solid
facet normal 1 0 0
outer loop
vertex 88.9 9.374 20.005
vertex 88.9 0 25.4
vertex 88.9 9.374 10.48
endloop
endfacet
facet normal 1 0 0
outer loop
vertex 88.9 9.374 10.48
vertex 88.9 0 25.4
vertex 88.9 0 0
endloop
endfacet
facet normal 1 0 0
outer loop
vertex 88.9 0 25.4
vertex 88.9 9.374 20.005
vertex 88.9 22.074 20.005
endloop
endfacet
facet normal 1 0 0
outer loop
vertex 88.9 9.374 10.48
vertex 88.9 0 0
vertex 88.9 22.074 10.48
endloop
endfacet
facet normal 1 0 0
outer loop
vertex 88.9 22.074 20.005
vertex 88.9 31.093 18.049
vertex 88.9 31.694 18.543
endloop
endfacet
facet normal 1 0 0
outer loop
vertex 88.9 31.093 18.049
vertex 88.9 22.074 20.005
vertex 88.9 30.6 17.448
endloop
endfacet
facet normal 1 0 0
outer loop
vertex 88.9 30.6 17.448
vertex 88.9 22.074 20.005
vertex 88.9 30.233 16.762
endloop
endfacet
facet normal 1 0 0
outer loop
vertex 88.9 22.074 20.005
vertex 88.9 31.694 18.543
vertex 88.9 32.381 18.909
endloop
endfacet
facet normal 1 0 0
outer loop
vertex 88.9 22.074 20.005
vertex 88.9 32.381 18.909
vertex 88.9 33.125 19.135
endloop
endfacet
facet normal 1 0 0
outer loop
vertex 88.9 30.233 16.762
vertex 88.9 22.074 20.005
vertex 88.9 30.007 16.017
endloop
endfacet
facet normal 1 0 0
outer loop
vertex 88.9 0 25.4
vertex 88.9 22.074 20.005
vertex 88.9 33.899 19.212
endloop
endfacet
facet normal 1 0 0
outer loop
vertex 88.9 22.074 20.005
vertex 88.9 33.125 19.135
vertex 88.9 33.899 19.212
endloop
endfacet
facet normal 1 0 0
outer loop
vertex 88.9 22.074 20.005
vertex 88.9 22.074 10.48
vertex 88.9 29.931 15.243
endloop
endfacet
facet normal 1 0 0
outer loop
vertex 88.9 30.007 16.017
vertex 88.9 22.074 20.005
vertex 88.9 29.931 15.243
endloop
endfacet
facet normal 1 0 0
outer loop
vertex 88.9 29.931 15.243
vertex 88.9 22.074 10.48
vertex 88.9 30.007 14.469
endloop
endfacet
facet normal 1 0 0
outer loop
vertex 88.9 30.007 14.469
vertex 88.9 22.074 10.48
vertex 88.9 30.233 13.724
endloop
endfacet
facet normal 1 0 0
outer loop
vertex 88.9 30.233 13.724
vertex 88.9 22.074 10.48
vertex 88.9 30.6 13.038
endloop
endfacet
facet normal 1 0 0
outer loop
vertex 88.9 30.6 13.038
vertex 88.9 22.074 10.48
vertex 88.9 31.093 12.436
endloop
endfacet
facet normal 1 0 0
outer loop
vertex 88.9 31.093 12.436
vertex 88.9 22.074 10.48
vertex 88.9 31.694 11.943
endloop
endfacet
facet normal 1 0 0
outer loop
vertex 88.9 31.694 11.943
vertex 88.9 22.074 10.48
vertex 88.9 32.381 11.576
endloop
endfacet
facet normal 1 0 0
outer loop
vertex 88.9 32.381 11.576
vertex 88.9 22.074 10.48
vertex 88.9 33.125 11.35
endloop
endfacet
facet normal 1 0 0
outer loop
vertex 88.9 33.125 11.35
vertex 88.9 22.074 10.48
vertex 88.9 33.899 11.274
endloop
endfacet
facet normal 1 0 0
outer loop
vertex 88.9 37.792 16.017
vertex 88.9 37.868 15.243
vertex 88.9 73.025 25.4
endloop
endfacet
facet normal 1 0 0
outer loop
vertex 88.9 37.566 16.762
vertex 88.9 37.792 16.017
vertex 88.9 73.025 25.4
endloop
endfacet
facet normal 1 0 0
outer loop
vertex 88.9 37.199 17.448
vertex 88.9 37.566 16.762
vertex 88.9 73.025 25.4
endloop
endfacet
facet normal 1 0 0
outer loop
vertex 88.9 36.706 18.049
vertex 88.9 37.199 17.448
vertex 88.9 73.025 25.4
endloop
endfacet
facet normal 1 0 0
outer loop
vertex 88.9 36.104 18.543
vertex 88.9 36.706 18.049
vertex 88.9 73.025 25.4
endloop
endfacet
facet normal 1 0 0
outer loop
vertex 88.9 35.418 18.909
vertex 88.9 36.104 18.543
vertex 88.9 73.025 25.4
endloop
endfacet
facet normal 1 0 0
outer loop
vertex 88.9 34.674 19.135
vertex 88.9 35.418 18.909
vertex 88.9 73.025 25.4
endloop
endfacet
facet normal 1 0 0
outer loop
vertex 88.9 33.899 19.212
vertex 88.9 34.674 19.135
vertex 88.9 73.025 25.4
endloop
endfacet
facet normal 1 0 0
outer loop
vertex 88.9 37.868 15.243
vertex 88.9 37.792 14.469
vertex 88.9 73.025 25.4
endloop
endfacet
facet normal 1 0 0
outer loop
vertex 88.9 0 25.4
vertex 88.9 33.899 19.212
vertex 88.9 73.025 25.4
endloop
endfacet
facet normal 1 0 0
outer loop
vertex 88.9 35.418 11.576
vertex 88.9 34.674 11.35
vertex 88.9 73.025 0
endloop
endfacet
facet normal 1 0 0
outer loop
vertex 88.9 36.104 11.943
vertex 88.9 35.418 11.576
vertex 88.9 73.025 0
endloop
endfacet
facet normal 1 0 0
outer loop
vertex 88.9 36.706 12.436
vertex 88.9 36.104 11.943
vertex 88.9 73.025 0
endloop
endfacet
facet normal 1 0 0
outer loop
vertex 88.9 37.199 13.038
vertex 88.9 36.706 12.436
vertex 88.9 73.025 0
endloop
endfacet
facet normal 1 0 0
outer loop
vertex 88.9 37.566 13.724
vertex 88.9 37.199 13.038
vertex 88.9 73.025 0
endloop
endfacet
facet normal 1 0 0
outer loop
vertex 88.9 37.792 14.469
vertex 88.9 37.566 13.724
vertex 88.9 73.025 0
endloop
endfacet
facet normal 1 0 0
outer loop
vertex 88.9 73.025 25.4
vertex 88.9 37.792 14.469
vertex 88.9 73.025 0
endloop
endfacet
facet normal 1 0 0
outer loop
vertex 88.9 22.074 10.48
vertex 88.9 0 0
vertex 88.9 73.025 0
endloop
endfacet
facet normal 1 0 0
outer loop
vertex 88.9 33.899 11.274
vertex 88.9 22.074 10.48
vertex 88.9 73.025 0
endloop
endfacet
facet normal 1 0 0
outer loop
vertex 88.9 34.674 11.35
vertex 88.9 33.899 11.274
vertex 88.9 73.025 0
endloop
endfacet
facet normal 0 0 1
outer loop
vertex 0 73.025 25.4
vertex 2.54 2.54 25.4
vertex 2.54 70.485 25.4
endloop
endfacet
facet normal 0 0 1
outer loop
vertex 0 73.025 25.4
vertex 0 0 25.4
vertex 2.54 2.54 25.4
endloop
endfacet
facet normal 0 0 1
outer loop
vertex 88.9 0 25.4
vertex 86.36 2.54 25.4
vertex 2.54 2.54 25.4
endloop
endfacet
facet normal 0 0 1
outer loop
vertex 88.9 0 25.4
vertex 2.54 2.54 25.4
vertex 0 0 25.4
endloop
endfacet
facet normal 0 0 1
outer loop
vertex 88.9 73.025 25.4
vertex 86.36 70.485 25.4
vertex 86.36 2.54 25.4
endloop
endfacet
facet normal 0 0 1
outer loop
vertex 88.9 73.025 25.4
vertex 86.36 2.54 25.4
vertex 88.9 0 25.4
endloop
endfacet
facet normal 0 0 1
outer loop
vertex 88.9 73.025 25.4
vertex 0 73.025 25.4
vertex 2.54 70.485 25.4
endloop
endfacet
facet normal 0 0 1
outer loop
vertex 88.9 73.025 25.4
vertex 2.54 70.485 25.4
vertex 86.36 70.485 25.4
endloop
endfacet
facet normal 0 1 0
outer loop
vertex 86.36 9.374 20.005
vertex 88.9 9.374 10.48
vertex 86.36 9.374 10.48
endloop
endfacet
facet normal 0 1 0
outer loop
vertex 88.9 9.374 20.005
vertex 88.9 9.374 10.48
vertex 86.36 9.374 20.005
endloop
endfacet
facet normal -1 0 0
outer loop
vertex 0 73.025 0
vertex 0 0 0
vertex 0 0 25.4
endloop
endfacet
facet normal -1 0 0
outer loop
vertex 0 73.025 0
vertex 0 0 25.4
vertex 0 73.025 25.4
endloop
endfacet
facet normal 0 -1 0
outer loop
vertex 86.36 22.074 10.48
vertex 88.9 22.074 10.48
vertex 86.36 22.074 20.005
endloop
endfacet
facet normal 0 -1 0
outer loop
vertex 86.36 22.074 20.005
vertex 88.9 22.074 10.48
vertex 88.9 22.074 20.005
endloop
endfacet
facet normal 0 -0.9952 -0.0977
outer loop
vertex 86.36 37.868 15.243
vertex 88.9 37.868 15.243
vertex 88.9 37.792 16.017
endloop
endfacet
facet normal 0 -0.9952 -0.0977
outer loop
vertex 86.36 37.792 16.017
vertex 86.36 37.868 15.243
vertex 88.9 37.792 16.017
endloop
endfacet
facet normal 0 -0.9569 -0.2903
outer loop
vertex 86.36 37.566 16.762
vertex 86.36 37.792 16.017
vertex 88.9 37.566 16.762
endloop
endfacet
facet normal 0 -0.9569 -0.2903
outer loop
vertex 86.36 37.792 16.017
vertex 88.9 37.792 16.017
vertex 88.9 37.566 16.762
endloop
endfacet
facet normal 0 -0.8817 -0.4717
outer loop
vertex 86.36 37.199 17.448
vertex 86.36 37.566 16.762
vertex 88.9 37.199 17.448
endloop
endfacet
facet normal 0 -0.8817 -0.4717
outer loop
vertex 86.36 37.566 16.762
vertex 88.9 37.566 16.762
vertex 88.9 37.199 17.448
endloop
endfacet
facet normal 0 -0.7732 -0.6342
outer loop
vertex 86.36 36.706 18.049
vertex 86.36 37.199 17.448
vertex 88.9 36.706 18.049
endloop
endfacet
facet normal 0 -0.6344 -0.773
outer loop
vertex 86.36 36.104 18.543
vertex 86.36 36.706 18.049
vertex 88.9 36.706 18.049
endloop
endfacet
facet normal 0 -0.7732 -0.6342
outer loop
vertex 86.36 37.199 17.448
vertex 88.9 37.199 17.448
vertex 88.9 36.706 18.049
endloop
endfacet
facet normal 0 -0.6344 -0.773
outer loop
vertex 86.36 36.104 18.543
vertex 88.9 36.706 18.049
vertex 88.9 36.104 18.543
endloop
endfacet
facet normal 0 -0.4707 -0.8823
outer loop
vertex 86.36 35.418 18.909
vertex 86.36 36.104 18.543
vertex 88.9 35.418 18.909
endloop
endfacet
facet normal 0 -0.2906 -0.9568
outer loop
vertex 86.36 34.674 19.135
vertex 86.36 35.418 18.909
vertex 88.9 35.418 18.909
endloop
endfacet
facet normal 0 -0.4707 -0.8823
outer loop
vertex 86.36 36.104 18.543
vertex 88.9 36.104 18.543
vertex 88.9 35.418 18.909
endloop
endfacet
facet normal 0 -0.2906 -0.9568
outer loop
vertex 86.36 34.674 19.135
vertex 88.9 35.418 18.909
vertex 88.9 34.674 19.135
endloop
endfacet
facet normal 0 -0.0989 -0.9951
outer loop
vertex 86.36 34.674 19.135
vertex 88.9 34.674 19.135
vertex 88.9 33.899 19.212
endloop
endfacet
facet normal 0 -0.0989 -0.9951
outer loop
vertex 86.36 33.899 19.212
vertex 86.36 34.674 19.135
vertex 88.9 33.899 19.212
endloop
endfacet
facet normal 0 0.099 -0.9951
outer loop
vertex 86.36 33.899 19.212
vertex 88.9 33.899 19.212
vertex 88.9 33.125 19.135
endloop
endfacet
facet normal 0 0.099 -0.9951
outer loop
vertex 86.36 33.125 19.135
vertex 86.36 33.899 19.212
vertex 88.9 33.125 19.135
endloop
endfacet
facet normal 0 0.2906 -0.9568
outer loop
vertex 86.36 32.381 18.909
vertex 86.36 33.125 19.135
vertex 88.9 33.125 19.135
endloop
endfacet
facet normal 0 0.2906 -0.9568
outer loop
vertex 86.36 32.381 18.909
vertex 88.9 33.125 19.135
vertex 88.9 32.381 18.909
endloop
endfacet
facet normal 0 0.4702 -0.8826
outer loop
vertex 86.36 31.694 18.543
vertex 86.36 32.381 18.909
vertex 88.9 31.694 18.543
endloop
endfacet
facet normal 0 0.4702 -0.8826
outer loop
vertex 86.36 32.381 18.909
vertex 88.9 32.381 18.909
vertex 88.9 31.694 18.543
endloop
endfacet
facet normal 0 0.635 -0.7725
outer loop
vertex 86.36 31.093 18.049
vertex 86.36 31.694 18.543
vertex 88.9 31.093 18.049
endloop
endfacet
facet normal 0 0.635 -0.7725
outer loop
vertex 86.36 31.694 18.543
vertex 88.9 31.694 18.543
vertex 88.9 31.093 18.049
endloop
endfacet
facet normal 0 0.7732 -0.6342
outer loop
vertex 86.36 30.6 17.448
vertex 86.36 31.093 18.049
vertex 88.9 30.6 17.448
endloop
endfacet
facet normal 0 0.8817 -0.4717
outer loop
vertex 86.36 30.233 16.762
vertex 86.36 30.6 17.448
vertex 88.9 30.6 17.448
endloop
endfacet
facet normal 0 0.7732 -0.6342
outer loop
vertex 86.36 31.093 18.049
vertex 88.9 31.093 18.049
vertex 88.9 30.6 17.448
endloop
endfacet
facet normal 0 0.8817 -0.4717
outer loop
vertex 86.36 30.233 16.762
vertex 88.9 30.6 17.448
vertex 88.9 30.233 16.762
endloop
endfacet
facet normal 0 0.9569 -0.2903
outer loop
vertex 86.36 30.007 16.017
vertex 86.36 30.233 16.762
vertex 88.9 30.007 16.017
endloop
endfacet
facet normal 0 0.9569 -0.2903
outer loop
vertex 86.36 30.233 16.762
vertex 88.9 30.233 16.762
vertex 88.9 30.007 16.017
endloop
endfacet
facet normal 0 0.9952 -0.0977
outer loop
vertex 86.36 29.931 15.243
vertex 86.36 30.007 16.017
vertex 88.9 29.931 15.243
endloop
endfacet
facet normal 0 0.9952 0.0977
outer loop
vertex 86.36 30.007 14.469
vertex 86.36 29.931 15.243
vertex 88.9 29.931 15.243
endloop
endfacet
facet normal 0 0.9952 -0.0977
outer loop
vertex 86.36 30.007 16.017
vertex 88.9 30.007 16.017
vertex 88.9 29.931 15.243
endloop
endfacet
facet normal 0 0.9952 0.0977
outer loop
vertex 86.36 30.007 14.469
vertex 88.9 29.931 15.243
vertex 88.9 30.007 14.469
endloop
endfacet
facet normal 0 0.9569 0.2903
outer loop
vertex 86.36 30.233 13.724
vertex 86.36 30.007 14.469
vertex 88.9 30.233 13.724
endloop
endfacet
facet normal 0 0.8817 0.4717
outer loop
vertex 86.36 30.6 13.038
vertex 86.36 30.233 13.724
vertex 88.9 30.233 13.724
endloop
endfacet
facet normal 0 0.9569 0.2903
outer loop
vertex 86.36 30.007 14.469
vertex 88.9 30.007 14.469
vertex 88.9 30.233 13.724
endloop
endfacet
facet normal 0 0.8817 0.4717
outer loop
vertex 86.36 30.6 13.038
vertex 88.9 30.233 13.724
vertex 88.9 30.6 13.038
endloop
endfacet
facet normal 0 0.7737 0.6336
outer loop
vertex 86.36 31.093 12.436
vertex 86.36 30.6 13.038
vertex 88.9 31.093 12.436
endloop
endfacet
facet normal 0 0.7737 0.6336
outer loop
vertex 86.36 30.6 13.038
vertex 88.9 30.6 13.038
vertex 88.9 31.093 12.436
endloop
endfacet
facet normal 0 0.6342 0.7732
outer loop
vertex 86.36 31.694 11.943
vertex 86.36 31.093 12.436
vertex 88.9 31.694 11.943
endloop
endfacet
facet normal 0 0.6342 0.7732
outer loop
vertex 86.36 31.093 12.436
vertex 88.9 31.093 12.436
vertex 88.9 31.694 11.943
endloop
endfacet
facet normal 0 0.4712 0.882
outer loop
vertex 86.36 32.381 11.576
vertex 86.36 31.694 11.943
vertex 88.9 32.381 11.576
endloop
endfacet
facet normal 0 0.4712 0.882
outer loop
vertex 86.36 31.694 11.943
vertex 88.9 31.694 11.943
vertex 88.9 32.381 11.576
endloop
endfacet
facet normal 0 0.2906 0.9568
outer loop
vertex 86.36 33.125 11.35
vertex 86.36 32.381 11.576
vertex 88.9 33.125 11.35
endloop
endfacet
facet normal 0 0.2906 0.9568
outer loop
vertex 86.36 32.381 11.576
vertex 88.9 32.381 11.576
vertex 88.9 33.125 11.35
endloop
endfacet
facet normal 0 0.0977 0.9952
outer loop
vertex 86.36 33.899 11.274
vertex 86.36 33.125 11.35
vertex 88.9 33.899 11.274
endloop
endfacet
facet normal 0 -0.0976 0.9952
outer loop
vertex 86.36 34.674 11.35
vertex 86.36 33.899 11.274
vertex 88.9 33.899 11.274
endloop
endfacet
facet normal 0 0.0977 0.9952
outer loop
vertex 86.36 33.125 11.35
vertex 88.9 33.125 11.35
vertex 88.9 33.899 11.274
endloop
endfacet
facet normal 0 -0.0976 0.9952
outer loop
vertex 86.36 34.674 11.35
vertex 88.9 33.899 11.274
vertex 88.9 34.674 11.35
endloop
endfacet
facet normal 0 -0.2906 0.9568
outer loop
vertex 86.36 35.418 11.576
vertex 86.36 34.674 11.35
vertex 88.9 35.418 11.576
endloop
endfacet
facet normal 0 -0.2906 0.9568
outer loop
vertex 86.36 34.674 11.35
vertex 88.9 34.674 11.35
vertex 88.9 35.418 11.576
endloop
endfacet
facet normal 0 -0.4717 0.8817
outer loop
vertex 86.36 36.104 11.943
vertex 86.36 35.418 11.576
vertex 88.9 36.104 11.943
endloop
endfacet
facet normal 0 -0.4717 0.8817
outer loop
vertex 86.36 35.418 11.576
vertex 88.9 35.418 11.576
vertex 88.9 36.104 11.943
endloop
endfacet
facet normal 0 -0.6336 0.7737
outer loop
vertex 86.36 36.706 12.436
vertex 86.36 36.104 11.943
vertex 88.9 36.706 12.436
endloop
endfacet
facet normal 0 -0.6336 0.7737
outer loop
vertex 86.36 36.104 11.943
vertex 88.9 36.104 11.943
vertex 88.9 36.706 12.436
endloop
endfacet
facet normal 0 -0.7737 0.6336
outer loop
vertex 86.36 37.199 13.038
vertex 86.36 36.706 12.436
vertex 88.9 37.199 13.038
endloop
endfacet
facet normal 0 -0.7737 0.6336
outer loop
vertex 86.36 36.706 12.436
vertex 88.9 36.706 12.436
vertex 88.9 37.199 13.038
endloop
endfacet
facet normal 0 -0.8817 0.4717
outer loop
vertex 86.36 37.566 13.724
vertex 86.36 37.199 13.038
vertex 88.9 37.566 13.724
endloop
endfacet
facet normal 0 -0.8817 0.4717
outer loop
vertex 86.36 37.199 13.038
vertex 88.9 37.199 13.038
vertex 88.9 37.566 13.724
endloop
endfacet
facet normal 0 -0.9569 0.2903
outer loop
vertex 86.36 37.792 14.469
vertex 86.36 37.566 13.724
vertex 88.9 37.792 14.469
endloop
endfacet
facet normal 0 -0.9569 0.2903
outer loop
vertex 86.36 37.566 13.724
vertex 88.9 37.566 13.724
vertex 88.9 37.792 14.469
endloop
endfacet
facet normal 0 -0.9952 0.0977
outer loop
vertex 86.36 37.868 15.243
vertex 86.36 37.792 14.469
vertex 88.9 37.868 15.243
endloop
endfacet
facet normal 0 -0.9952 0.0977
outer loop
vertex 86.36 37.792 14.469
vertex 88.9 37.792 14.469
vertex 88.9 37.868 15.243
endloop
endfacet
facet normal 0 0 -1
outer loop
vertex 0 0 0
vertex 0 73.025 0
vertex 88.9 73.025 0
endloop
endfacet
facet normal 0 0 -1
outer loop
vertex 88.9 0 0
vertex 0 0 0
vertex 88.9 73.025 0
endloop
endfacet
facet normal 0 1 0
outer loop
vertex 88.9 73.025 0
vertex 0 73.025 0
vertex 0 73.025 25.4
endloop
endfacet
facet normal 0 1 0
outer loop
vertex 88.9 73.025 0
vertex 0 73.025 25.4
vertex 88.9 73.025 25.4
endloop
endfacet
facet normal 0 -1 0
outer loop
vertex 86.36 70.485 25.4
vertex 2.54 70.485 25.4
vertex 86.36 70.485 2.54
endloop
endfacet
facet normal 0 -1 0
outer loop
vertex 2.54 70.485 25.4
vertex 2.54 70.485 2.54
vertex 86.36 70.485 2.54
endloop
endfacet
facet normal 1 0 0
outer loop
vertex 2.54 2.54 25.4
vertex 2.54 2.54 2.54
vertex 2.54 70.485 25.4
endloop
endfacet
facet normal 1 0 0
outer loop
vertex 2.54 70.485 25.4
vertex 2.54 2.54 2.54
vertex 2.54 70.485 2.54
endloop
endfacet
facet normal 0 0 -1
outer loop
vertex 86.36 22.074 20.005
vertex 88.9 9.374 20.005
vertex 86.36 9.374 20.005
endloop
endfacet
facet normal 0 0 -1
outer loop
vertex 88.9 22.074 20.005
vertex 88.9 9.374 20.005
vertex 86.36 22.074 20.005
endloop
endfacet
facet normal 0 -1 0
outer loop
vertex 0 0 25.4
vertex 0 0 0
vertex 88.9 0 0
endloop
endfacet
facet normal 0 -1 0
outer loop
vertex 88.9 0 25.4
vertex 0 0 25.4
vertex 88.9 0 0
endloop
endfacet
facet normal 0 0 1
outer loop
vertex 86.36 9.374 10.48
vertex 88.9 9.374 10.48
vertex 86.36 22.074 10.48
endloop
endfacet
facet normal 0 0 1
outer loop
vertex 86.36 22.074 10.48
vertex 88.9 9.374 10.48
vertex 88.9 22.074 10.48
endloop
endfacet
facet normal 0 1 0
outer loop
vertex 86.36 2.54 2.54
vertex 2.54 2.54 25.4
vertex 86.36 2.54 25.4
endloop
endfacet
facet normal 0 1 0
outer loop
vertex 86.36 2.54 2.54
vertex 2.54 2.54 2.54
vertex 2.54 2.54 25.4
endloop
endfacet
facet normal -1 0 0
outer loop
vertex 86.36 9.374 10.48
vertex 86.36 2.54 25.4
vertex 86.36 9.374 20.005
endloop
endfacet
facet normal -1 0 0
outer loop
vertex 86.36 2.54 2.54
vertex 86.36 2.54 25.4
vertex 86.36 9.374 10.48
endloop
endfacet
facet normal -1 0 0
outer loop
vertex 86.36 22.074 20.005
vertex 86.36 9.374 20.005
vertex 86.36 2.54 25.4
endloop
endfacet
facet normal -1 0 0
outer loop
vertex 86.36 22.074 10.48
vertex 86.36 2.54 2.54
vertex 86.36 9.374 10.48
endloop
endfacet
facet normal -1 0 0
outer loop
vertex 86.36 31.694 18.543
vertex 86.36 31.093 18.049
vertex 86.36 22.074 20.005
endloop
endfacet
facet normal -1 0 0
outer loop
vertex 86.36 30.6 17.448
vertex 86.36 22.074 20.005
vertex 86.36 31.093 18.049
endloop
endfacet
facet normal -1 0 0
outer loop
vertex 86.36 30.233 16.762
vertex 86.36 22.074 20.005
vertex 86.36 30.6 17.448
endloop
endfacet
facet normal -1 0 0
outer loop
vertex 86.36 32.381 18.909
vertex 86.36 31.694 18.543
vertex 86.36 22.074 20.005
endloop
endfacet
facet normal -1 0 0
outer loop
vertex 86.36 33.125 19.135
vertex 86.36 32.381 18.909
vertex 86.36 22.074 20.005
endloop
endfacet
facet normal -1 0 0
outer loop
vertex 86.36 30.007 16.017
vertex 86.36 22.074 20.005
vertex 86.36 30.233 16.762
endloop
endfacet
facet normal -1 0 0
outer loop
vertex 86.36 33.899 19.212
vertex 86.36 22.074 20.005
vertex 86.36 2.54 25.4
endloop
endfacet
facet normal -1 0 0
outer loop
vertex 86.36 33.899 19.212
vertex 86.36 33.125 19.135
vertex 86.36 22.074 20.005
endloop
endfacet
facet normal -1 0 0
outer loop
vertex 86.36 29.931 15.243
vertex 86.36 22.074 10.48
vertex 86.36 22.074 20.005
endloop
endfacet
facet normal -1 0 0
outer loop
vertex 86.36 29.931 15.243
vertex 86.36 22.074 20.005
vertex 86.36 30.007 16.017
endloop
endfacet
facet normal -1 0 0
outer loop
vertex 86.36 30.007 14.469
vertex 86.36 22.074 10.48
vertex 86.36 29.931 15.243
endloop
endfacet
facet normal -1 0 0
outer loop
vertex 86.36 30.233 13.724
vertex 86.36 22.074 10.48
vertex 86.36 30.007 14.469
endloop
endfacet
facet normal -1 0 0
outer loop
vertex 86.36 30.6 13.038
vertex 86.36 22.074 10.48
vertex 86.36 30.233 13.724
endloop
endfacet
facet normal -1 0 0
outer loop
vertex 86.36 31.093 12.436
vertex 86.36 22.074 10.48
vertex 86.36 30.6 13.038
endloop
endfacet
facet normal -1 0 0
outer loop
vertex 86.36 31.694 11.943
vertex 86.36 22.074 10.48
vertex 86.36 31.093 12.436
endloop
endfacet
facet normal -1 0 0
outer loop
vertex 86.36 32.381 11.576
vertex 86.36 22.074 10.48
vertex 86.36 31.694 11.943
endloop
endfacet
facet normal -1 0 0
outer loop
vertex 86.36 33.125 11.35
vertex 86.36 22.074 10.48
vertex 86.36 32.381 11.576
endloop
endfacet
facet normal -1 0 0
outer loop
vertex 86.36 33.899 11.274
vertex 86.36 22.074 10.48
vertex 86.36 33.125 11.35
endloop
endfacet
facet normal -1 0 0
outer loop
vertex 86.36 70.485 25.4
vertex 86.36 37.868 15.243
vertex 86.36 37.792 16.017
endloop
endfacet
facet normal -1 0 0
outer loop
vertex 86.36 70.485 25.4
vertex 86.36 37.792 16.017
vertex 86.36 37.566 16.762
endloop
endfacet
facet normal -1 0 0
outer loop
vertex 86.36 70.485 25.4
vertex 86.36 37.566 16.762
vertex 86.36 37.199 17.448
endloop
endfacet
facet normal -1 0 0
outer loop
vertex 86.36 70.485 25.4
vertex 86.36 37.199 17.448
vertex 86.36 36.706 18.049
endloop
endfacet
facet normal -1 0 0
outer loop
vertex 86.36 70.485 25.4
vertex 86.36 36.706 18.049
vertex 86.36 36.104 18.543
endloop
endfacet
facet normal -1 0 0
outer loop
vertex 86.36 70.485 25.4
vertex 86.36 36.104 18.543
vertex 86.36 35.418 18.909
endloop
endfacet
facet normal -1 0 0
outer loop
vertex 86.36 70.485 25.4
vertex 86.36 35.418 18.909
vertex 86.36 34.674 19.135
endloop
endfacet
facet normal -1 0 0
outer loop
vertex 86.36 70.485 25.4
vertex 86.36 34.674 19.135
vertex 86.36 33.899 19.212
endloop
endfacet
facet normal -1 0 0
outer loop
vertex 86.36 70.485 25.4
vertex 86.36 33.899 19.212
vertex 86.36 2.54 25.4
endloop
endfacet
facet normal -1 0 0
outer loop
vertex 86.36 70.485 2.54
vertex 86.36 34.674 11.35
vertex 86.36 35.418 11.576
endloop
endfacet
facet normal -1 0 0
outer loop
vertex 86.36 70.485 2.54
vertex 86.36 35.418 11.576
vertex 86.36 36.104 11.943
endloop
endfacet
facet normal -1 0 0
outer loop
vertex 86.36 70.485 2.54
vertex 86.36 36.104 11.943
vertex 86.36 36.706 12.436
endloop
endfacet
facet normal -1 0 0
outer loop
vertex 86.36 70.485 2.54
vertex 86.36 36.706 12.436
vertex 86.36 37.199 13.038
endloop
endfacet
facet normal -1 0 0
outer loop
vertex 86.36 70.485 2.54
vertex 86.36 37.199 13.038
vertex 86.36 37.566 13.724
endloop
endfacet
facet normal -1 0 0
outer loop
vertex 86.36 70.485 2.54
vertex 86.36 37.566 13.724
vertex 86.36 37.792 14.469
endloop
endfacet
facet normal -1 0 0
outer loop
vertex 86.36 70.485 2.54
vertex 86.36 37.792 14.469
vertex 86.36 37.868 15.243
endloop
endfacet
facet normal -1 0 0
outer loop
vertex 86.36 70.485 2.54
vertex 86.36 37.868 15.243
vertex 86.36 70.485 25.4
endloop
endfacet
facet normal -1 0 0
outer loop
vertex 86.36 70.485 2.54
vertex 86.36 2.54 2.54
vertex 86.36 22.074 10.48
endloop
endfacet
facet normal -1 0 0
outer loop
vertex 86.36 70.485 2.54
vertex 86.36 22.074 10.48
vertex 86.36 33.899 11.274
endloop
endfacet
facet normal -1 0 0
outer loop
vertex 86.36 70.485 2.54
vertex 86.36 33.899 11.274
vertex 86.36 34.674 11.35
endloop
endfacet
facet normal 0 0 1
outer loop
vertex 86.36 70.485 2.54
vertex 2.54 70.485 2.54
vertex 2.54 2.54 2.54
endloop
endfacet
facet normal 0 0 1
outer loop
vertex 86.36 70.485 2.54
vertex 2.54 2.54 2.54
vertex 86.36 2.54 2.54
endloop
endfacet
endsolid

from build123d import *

# Parameters (mm, degrees)
F0_W     = 88.9
F0_H     = 73.025
F1_DEPTH = 25.4
F2_T     = -2.54
F3_W     = 12.7
F3_H     = 9.525
F3_R     = 3.96875
F4_DEPTH = 2.54


with BuildPart() as f1:
    # F0 (on Top) → F1 (new body)
    with BuildSketch(Plane.XY):
        with Locations((44.45, 36.5125)):
            Rectangle(F0_W, F0_H)
    extrude(amount=F1_DEPTH)

    # F2
    f2_openings = [f1.faces().sort_by_distance(p)[0] for p in [
        (44.45, 36.5125, 25.4),
    ]]
    offset(amount=F2_T, openings=f2_openings)

    # F3 (on face) → F4 (cut)
    with BuildSketch(Plane.YZ.offset(88.9)):
        with Locations((15.723732, 15.242798)):
            Rectangle(F3_W, F3_H)
        with Locations((33.899404, 15.242798)):
            Circle(F3_R)
    extrude(amount=-F4_DEPTH, mode=Mode.SUBTRACT)


solid = f1.part
